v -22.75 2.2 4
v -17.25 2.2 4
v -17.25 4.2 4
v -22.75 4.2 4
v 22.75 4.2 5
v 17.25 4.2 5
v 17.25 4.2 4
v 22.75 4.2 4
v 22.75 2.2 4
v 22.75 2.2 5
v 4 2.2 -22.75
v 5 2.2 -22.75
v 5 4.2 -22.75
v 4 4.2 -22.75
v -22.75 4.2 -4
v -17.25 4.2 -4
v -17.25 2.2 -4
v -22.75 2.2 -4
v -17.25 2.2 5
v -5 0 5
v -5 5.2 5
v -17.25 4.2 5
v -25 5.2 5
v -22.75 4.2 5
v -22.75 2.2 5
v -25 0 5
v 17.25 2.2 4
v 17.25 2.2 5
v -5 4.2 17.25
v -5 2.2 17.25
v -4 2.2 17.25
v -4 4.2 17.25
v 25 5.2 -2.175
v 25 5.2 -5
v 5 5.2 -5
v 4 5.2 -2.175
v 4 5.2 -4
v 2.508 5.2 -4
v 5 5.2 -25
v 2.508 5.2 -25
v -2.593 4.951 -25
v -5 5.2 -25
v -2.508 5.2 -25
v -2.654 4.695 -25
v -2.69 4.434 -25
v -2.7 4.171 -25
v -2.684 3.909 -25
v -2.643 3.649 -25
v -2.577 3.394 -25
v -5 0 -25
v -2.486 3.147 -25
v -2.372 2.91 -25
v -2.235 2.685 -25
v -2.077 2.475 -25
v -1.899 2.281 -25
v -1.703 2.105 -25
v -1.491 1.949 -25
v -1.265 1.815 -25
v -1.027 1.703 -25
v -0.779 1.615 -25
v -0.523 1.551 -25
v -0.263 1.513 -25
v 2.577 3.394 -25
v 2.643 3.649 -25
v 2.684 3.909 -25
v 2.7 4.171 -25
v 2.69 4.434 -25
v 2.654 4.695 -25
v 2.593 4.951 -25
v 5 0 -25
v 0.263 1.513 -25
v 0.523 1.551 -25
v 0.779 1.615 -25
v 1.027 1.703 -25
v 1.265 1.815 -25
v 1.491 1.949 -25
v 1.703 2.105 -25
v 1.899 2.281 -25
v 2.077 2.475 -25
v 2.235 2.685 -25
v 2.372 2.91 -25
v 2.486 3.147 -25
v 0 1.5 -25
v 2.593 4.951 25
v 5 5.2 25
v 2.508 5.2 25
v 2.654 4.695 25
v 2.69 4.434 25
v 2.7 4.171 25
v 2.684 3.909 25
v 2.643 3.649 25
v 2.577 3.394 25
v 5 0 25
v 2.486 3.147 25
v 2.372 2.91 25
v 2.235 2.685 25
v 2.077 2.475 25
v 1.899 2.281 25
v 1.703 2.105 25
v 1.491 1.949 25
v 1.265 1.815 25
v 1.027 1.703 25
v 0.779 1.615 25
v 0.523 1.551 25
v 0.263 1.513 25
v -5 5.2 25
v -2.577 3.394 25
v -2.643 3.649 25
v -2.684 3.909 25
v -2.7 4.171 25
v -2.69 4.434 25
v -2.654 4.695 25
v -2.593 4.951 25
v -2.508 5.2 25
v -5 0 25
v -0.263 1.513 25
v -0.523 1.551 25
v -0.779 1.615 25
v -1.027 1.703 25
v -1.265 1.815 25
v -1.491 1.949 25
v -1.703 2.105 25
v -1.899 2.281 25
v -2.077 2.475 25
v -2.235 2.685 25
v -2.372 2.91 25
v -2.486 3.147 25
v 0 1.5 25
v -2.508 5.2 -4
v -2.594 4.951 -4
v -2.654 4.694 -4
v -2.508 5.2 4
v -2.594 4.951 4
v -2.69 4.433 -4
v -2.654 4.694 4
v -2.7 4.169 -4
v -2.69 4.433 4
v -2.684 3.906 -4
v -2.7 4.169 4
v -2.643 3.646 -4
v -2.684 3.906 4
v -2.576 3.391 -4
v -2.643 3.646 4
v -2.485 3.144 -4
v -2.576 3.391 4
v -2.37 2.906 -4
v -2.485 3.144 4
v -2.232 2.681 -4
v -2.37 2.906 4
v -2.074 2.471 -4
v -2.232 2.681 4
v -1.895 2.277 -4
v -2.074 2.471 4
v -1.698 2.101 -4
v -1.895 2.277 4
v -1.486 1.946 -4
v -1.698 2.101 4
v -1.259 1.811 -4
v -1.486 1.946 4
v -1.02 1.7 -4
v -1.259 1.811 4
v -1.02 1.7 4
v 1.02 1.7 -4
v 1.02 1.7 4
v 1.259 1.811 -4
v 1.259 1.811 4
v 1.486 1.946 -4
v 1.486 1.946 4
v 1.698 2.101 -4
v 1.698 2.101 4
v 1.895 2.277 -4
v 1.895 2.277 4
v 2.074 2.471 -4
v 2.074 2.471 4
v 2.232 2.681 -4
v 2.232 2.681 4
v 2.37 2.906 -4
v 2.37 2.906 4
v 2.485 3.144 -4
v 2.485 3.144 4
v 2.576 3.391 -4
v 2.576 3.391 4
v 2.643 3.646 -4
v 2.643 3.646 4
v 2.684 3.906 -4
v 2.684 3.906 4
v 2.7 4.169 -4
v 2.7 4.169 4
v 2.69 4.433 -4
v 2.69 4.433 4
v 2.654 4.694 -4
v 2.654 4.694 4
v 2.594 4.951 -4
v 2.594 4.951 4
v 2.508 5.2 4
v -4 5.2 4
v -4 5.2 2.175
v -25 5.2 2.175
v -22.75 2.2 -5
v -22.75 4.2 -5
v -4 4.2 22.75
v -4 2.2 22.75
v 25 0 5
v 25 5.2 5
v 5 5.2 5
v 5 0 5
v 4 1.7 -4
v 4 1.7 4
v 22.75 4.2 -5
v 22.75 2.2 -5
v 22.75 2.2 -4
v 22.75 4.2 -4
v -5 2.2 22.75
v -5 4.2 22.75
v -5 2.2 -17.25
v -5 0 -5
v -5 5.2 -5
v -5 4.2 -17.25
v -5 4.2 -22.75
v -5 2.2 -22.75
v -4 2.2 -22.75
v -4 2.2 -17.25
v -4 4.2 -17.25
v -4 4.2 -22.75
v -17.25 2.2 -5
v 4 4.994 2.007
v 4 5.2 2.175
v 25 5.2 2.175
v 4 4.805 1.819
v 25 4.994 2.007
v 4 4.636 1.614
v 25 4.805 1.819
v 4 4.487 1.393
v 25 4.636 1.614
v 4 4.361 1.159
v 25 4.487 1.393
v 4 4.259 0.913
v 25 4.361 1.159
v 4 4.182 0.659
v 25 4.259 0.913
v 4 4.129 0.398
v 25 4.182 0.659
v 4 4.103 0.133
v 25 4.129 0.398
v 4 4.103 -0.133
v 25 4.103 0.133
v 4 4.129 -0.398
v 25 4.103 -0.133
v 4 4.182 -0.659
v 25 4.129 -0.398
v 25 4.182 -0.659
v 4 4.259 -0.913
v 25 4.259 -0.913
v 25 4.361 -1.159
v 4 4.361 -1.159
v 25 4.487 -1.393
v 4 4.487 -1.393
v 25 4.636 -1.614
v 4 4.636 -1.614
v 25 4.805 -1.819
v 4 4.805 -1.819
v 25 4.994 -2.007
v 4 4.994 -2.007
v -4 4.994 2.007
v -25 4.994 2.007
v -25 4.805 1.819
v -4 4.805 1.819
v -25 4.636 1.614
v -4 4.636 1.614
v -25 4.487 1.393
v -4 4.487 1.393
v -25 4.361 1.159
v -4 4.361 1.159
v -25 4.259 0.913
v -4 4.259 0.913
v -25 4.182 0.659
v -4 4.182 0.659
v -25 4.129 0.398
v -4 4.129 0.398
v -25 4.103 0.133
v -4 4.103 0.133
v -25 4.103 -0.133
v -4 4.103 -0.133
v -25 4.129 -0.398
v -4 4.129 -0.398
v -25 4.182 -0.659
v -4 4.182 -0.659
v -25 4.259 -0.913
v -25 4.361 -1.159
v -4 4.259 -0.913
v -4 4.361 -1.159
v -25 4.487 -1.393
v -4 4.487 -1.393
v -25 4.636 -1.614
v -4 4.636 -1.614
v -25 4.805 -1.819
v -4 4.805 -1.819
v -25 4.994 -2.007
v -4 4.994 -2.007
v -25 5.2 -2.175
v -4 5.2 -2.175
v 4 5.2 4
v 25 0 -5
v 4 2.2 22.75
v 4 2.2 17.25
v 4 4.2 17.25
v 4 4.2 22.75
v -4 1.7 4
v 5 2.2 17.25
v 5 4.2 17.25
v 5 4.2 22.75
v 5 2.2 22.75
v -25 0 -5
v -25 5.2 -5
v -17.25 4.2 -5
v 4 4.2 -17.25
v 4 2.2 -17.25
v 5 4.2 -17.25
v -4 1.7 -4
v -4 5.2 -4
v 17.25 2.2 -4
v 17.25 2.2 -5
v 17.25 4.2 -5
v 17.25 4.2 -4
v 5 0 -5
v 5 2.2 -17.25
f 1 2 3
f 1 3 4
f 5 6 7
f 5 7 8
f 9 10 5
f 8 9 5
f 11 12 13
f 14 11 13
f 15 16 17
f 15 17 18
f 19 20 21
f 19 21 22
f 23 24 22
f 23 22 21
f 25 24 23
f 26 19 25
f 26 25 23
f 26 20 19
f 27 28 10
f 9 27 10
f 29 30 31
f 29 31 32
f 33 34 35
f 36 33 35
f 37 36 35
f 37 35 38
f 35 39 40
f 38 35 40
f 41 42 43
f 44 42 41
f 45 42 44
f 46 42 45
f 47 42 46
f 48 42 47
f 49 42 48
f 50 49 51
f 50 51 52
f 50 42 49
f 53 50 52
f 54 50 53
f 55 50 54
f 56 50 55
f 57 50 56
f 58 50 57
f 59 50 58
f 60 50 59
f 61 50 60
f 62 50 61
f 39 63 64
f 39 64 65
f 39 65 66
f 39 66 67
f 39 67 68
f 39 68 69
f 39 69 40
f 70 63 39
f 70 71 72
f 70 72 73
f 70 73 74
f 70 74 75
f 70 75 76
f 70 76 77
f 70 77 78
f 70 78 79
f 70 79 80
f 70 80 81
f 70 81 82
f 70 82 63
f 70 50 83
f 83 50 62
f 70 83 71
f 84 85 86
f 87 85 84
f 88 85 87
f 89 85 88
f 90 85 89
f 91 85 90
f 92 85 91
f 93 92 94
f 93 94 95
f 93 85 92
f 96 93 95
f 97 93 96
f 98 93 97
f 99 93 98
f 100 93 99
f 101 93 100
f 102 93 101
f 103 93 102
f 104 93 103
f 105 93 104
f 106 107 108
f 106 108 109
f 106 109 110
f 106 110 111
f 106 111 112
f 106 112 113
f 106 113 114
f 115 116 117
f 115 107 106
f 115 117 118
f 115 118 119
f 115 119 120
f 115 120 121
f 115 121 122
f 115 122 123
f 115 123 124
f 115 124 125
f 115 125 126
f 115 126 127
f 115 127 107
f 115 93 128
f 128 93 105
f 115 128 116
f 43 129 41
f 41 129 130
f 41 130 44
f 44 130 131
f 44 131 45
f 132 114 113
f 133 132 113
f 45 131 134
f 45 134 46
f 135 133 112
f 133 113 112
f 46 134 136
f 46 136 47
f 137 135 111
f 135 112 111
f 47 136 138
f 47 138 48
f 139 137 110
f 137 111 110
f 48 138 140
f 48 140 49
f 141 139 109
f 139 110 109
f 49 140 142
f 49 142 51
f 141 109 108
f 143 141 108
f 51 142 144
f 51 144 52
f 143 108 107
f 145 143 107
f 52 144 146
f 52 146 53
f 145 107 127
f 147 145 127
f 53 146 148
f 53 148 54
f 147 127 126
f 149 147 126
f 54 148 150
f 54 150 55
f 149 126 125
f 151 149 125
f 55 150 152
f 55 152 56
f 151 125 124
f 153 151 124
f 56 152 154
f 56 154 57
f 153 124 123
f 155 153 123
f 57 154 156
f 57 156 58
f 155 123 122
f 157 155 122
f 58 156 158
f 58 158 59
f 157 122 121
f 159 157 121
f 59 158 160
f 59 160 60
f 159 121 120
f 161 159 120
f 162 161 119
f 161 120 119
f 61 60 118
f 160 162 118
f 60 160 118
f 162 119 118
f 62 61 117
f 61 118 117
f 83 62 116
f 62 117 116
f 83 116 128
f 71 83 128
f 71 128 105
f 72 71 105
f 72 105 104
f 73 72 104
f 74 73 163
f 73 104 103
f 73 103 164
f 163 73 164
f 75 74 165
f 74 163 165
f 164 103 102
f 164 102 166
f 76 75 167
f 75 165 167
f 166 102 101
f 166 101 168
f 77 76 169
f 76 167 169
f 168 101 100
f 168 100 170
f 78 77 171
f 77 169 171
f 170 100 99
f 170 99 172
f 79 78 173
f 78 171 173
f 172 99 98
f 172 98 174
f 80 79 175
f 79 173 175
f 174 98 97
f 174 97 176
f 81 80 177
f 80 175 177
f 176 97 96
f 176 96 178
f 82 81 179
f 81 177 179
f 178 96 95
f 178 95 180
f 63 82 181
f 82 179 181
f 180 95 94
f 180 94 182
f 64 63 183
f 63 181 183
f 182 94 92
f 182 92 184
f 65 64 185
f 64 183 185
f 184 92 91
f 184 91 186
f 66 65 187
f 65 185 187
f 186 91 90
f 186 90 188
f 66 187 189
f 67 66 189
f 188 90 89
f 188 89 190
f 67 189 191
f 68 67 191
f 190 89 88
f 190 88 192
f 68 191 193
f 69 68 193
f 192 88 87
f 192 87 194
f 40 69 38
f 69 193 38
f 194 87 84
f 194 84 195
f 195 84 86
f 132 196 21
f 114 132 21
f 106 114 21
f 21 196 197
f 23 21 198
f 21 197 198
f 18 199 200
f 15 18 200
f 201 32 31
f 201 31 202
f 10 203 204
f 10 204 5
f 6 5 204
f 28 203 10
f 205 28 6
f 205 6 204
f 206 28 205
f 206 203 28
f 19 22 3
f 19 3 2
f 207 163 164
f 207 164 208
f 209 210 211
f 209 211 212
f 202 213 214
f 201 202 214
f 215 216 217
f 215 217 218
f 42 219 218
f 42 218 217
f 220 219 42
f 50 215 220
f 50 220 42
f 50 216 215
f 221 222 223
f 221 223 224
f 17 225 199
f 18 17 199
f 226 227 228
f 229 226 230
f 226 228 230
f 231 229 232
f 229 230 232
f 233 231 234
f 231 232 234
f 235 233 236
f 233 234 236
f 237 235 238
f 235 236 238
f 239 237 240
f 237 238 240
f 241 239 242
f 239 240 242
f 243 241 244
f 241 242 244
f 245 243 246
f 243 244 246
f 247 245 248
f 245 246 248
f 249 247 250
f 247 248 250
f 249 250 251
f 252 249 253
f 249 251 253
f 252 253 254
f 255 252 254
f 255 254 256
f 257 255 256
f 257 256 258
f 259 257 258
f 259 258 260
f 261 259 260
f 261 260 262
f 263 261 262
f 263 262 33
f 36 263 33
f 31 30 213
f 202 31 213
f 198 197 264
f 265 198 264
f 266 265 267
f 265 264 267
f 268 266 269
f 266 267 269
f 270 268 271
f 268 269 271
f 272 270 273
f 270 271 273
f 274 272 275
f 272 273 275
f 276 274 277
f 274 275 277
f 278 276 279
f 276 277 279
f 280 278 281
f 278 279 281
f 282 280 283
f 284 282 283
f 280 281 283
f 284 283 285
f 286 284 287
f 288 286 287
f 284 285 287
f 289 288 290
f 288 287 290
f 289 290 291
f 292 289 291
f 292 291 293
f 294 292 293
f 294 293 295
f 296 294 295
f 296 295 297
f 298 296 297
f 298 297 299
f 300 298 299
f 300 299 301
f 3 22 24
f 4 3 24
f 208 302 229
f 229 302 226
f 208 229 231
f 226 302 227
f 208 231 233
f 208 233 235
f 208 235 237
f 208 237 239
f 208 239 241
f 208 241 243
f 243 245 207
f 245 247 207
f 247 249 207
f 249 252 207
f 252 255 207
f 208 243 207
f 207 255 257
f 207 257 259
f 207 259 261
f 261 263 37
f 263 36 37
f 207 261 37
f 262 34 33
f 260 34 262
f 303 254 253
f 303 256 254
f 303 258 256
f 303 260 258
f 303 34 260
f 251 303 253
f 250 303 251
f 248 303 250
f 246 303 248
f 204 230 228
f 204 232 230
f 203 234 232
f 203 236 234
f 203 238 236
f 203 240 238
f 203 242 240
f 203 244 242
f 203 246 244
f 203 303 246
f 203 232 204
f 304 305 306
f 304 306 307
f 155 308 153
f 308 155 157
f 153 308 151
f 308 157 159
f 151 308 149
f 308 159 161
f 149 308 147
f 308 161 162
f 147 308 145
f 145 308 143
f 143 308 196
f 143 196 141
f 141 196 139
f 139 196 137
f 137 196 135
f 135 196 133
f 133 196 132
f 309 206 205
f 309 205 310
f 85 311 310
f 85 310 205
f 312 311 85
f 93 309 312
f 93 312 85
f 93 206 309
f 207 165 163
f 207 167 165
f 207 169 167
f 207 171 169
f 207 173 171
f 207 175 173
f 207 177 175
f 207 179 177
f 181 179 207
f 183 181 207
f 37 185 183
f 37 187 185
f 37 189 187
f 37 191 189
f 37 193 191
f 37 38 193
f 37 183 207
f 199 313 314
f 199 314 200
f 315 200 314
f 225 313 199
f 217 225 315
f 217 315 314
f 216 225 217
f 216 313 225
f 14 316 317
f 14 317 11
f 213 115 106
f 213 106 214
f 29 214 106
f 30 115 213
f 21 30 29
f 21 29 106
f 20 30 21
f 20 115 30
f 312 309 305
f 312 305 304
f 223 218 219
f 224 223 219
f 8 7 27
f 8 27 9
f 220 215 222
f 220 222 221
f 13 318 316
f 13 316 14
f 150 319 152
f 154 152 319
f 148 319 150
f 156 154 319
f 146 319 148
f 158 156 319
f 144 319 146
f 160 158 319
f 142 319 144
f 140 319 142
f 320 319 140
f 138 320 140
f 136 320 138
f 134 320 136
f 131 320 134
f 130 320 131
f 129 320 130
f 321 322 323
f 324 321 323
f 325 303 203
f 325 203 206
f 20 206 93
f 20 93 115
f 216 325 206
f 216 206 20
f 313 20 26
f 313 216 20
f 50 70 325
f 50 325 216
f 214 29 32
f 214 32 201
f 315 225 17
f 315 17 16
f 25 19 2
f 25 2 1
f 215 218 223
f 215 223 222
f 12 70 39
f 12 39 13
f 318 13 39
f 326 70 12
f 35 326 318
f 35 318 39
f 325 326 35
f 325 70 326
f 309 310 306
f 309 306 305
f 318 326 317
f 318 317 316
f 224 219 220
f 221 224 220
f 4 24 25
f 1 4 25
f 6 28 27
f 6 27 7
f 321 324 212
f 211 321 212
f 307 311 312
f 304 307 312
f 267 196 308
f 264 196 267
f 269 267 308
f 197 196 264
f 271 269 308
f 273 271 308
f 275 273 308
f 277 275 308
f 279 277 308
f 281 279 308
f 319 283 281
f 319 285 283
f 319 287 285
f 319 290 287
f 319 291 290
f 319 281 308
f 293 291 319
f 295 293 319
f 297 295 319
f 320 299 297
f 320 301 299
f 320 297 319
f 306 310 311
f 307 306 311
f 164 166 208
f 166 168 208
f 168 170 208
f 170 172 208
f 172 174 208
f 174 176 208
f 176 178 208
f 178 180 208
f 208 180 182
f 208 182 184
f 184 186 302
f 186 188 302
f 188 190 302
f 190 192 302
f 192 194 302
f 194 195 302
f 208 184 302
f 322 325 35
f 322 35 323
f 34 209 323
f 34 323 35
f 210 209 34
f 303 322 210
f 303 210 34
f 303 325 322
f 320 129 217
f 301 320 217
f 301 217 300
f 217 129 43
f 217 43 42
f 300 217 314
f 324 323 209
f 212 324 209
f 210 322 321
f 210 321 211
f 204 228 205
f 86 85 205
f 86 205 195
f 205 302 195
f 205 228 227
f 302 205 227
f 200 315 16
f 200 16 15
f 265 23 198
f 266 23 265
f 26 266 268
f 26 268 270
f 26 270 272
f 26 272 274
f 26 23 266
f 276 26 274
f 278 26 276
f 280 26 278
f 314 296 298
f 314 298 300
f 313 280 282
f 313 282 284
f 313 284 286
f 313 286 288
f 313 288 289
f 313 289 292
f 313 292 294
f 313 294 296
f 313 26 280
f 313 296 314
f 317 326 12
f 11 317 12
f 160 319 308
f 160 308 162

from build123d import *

# Parameters (mm, degrees)
BOSS_EXTRUDE5_DEPTH         = 5.2
CUT_EXTRUDE1_REACH          = 58.143
SKETCH4_R                   = 2.7
SKETCH5_R                   = 2.7
CUT_EXTRUDE2_DEPTH          = 57.143031625
SKETCH6_W                   = 8
SKETCH6_H                   = 8
CUT_EXTRUDE3_DEPTH          = 3.5
SKETCH7_W                   = 5.5
SKETCH7_H                   = 2
CUT_EXTRUDE4_DEPTH          = 1
CIRPATTERN1_COPY_1_SKETCH_W = 5.5
CIRPATTERN1_COPY_1_SKETCH_H = 2
CIRPATTERN1_COPY_1_DEPTH    = 1
CIRPATTERN1_COPY_2_SKETCH_W = 5.5
CIRPATTERN1_COPY_2_SKETCH_H = 2
CIRPATTERN1_COPY_2_DEPTH    = 1
CIRPATTERN1_COPY_3_SKETCH_W = 5.5
CIRPATTERN1_COPY_3_SKETCH_H = 2
CIRPATTERN1_COPY_3_DEPTH    = 1
CIRPATTERN1_COPY_4_SKETCH_W = 5.5
CIRPATTERN1_COPY_4_SKETCH_H = 2
CIRPATTERN1_COPY_4_DEPTH    = 1
CIRPATTERN1_COPY_5_SKETCH_W = 5.5
CIRPATTERN1_COPY_5_SKETCH_H = 2
CIRPATTERN1_COPY_5_DEPTH    = 1
CIRPATTERN1_COPY_6_SKETCH_W = 5.5
CIRPATTERN1_COPY_6_SKETCH_H = 2
CIRPATTERN1_COPY_6_DEPTH    = 1


with BuildPart() as part:
    # Sketch3 → Boss-Extrude5 (new body)
    with BuildSketch(Plane(origin=(0, 0, 0), x_dir=(1, 0, 0), z_dir=(0, 1, 0))):
        Polygon((5, 5), (25, 5), (25, -5), (5, -5), (5, -25), (-5, -25), (-5, -5), (-25, -5), (-25, 5), (-5, 5), (-5, 25), (5, 25), align=None)
    extrude(amount=BOSS_EXTRUDE5_DEPTH)

    # Sketch4 → Cut-Extrude1 (cut, up to next)
    with BuildSketch(Plane.XY.offset(25), mode=Mode.PRIVATE) as cut_extrude1_sk1:
        with Locations((0, 4.2)):
            Circle(SKETCH4_R)
    cut_extrude1_tool1 = extrude(cut_extrude1_sk1.sketch, amount=-CUT_EXTRUDE1_REACH, mode=Mode.PRIVATE) & part.part
    add(cut_extrude1_tool1.solids().sort_by_distance((0, 4.2, 25))[0], mode=Mode.SUBTRACT)

    # Sketch5 → Cut-Extrude2 (cut, through all)
    with BuildSketch(Plane(origin=(25, 0, 0), x_dir=(0, 0, -1), z_dir=(1, 0, 0))):
        with Locations((0, 6.8)):
            Circle(SKETCH5_R)
    extrude(amount=-CUT_EXTRUDE2_DEPTH, mode=Mode.SUBTRACT)

    # Sketch6 → Cut-Extrude3 (cut)
    with BuildSketch(Plane(origin=(0, 5.2, 0), x_dir=(1, 0, 0), z_dir=(0, 1, 0))):
        Rectangle(SKETCH6_W, SKETCH6_H)
    extrude(amount=-CUT_EXTRUDE3_DEPTH, mode=Mode.SUBTRACT)

    # Sketch7 → Cut-Extrude4 (cut)
    with BuildSketch(Plane.XY.offset(5)):
        with Locations((20, 3.2)):
            Rectangle(SKETCH7_W, SKETCH7_H)
    cut_extrude4 = extrude(amount=-CUT_EXTRUDE4_DEPTH, mode=Mode.SUBTRACT)

    # Mirror1: Cut-Extrude4 across plane
    add(cut_extrude4.mirror(Plane.XY), mode=Mode.SUBTRACT)

    # CirPattern1 copy 1 sketch → CirPattern1 copy 1 (cut)
    with BuildSketch(Plane(origin=(5, 0, 0), x_dir=(0, 0, 1), z_dir=(1, 0, 0))):
        with Locations((20, -3.2)):
            Rectangle(CIRPATTERN1_COPY_1_SKETCH_W, CIRPATTERN1_COPY_1_SKETCH_H)
    extrude(amount=-CIRPATTERN1_COPY_1_DEPTH, mode=Mode.SUBTRACT)

    # CirPattern1 copy 2 sketch → CirPattern1 copy 2 (cut)
    with BuildSketch(Plane(origin=(0, 0, 5), x_dir=(-1, 0, 0), z_dir=(0, 0, 1))):
        with Locations((20, -3.2)):
            Rectangle(CIRPATTERN1_COPY_2_SKETCH_W, CIRPATTERN1_COPY_2_SKETCH_H)
    extrude(amount=-CIRPATTERN1_COPY_2_DEPTH, mode=Mode.SUBTRACT)

    # CirPattern1 copy 3 sketch → CirPattern1 copy 3 (cut)
    with BuildSketch(Plane(origin=(-5, 0, 0), x_dir=(0, 0, -1), z_dir=(-1, 0, 0))):
        with Locations((20, -3.2)):
            Rectangle(CIRPATTERN1_COPY_3_SKETCH_W, CIRPATTERN1_COPY_3_SKETCH_H)
    extrude(amount=-CIRPATTERN1_COPY_3_DEPTH, mode=Mode.SUBTRACT)

    # CirPattern1 copy 4 sketch → CirPattern1 copy 4 (cut)
    with BuildSketch(Plane.ZY.offset(5)):
        with Locations((20, 3.2)):
            Rectangle(CIRPATTERN1_COPY_4_SKETCH_W, CIRPATTERN1_COPY_4_SKETCH_H)
    extrude(amount=-CIRPATTERN1_COPY_4_DEPTH, mode=Mode.SUBTRACT)

    # CirPattern1 copy 5 sketch → CirPattern1 copy 5 (cut)
    with BuildSketch(Plane(origin=(0, 0, -5), x_dir=(-1, 0, 0), z_dir=(0, 0, -1))):
        with Locations((20, 3.2)):
            Rectangle(CIRPATTERN1_COPY_5_SKETCH_W, CIRPATTERN1_COPY_5_SKETCH_H)
    extrude(amount=-CIRPATTERN1_COPY_5_DEPTH, mode=Mode.SUBTRACT)

    # CirPattern1 copy 6 sketch → CirPattern1 copy 6 (cut)
    with BuildSketch(Plane(origin=(5, 0, 0), x_dir=(0, 0, -1), z_dir=(1, 0, 0))):
        with Locations((20, 3.2)):
            Rectangle(CIRPATTERN1_COPY_6_SKETCH_W, CIRPATTERN1_COPY_6_SKETCH_H)
    extrude(amount=-CIRPATTERN1_COPY_6_DEPTH, mode=Mode.SUBTRACT)


solid = part.part
